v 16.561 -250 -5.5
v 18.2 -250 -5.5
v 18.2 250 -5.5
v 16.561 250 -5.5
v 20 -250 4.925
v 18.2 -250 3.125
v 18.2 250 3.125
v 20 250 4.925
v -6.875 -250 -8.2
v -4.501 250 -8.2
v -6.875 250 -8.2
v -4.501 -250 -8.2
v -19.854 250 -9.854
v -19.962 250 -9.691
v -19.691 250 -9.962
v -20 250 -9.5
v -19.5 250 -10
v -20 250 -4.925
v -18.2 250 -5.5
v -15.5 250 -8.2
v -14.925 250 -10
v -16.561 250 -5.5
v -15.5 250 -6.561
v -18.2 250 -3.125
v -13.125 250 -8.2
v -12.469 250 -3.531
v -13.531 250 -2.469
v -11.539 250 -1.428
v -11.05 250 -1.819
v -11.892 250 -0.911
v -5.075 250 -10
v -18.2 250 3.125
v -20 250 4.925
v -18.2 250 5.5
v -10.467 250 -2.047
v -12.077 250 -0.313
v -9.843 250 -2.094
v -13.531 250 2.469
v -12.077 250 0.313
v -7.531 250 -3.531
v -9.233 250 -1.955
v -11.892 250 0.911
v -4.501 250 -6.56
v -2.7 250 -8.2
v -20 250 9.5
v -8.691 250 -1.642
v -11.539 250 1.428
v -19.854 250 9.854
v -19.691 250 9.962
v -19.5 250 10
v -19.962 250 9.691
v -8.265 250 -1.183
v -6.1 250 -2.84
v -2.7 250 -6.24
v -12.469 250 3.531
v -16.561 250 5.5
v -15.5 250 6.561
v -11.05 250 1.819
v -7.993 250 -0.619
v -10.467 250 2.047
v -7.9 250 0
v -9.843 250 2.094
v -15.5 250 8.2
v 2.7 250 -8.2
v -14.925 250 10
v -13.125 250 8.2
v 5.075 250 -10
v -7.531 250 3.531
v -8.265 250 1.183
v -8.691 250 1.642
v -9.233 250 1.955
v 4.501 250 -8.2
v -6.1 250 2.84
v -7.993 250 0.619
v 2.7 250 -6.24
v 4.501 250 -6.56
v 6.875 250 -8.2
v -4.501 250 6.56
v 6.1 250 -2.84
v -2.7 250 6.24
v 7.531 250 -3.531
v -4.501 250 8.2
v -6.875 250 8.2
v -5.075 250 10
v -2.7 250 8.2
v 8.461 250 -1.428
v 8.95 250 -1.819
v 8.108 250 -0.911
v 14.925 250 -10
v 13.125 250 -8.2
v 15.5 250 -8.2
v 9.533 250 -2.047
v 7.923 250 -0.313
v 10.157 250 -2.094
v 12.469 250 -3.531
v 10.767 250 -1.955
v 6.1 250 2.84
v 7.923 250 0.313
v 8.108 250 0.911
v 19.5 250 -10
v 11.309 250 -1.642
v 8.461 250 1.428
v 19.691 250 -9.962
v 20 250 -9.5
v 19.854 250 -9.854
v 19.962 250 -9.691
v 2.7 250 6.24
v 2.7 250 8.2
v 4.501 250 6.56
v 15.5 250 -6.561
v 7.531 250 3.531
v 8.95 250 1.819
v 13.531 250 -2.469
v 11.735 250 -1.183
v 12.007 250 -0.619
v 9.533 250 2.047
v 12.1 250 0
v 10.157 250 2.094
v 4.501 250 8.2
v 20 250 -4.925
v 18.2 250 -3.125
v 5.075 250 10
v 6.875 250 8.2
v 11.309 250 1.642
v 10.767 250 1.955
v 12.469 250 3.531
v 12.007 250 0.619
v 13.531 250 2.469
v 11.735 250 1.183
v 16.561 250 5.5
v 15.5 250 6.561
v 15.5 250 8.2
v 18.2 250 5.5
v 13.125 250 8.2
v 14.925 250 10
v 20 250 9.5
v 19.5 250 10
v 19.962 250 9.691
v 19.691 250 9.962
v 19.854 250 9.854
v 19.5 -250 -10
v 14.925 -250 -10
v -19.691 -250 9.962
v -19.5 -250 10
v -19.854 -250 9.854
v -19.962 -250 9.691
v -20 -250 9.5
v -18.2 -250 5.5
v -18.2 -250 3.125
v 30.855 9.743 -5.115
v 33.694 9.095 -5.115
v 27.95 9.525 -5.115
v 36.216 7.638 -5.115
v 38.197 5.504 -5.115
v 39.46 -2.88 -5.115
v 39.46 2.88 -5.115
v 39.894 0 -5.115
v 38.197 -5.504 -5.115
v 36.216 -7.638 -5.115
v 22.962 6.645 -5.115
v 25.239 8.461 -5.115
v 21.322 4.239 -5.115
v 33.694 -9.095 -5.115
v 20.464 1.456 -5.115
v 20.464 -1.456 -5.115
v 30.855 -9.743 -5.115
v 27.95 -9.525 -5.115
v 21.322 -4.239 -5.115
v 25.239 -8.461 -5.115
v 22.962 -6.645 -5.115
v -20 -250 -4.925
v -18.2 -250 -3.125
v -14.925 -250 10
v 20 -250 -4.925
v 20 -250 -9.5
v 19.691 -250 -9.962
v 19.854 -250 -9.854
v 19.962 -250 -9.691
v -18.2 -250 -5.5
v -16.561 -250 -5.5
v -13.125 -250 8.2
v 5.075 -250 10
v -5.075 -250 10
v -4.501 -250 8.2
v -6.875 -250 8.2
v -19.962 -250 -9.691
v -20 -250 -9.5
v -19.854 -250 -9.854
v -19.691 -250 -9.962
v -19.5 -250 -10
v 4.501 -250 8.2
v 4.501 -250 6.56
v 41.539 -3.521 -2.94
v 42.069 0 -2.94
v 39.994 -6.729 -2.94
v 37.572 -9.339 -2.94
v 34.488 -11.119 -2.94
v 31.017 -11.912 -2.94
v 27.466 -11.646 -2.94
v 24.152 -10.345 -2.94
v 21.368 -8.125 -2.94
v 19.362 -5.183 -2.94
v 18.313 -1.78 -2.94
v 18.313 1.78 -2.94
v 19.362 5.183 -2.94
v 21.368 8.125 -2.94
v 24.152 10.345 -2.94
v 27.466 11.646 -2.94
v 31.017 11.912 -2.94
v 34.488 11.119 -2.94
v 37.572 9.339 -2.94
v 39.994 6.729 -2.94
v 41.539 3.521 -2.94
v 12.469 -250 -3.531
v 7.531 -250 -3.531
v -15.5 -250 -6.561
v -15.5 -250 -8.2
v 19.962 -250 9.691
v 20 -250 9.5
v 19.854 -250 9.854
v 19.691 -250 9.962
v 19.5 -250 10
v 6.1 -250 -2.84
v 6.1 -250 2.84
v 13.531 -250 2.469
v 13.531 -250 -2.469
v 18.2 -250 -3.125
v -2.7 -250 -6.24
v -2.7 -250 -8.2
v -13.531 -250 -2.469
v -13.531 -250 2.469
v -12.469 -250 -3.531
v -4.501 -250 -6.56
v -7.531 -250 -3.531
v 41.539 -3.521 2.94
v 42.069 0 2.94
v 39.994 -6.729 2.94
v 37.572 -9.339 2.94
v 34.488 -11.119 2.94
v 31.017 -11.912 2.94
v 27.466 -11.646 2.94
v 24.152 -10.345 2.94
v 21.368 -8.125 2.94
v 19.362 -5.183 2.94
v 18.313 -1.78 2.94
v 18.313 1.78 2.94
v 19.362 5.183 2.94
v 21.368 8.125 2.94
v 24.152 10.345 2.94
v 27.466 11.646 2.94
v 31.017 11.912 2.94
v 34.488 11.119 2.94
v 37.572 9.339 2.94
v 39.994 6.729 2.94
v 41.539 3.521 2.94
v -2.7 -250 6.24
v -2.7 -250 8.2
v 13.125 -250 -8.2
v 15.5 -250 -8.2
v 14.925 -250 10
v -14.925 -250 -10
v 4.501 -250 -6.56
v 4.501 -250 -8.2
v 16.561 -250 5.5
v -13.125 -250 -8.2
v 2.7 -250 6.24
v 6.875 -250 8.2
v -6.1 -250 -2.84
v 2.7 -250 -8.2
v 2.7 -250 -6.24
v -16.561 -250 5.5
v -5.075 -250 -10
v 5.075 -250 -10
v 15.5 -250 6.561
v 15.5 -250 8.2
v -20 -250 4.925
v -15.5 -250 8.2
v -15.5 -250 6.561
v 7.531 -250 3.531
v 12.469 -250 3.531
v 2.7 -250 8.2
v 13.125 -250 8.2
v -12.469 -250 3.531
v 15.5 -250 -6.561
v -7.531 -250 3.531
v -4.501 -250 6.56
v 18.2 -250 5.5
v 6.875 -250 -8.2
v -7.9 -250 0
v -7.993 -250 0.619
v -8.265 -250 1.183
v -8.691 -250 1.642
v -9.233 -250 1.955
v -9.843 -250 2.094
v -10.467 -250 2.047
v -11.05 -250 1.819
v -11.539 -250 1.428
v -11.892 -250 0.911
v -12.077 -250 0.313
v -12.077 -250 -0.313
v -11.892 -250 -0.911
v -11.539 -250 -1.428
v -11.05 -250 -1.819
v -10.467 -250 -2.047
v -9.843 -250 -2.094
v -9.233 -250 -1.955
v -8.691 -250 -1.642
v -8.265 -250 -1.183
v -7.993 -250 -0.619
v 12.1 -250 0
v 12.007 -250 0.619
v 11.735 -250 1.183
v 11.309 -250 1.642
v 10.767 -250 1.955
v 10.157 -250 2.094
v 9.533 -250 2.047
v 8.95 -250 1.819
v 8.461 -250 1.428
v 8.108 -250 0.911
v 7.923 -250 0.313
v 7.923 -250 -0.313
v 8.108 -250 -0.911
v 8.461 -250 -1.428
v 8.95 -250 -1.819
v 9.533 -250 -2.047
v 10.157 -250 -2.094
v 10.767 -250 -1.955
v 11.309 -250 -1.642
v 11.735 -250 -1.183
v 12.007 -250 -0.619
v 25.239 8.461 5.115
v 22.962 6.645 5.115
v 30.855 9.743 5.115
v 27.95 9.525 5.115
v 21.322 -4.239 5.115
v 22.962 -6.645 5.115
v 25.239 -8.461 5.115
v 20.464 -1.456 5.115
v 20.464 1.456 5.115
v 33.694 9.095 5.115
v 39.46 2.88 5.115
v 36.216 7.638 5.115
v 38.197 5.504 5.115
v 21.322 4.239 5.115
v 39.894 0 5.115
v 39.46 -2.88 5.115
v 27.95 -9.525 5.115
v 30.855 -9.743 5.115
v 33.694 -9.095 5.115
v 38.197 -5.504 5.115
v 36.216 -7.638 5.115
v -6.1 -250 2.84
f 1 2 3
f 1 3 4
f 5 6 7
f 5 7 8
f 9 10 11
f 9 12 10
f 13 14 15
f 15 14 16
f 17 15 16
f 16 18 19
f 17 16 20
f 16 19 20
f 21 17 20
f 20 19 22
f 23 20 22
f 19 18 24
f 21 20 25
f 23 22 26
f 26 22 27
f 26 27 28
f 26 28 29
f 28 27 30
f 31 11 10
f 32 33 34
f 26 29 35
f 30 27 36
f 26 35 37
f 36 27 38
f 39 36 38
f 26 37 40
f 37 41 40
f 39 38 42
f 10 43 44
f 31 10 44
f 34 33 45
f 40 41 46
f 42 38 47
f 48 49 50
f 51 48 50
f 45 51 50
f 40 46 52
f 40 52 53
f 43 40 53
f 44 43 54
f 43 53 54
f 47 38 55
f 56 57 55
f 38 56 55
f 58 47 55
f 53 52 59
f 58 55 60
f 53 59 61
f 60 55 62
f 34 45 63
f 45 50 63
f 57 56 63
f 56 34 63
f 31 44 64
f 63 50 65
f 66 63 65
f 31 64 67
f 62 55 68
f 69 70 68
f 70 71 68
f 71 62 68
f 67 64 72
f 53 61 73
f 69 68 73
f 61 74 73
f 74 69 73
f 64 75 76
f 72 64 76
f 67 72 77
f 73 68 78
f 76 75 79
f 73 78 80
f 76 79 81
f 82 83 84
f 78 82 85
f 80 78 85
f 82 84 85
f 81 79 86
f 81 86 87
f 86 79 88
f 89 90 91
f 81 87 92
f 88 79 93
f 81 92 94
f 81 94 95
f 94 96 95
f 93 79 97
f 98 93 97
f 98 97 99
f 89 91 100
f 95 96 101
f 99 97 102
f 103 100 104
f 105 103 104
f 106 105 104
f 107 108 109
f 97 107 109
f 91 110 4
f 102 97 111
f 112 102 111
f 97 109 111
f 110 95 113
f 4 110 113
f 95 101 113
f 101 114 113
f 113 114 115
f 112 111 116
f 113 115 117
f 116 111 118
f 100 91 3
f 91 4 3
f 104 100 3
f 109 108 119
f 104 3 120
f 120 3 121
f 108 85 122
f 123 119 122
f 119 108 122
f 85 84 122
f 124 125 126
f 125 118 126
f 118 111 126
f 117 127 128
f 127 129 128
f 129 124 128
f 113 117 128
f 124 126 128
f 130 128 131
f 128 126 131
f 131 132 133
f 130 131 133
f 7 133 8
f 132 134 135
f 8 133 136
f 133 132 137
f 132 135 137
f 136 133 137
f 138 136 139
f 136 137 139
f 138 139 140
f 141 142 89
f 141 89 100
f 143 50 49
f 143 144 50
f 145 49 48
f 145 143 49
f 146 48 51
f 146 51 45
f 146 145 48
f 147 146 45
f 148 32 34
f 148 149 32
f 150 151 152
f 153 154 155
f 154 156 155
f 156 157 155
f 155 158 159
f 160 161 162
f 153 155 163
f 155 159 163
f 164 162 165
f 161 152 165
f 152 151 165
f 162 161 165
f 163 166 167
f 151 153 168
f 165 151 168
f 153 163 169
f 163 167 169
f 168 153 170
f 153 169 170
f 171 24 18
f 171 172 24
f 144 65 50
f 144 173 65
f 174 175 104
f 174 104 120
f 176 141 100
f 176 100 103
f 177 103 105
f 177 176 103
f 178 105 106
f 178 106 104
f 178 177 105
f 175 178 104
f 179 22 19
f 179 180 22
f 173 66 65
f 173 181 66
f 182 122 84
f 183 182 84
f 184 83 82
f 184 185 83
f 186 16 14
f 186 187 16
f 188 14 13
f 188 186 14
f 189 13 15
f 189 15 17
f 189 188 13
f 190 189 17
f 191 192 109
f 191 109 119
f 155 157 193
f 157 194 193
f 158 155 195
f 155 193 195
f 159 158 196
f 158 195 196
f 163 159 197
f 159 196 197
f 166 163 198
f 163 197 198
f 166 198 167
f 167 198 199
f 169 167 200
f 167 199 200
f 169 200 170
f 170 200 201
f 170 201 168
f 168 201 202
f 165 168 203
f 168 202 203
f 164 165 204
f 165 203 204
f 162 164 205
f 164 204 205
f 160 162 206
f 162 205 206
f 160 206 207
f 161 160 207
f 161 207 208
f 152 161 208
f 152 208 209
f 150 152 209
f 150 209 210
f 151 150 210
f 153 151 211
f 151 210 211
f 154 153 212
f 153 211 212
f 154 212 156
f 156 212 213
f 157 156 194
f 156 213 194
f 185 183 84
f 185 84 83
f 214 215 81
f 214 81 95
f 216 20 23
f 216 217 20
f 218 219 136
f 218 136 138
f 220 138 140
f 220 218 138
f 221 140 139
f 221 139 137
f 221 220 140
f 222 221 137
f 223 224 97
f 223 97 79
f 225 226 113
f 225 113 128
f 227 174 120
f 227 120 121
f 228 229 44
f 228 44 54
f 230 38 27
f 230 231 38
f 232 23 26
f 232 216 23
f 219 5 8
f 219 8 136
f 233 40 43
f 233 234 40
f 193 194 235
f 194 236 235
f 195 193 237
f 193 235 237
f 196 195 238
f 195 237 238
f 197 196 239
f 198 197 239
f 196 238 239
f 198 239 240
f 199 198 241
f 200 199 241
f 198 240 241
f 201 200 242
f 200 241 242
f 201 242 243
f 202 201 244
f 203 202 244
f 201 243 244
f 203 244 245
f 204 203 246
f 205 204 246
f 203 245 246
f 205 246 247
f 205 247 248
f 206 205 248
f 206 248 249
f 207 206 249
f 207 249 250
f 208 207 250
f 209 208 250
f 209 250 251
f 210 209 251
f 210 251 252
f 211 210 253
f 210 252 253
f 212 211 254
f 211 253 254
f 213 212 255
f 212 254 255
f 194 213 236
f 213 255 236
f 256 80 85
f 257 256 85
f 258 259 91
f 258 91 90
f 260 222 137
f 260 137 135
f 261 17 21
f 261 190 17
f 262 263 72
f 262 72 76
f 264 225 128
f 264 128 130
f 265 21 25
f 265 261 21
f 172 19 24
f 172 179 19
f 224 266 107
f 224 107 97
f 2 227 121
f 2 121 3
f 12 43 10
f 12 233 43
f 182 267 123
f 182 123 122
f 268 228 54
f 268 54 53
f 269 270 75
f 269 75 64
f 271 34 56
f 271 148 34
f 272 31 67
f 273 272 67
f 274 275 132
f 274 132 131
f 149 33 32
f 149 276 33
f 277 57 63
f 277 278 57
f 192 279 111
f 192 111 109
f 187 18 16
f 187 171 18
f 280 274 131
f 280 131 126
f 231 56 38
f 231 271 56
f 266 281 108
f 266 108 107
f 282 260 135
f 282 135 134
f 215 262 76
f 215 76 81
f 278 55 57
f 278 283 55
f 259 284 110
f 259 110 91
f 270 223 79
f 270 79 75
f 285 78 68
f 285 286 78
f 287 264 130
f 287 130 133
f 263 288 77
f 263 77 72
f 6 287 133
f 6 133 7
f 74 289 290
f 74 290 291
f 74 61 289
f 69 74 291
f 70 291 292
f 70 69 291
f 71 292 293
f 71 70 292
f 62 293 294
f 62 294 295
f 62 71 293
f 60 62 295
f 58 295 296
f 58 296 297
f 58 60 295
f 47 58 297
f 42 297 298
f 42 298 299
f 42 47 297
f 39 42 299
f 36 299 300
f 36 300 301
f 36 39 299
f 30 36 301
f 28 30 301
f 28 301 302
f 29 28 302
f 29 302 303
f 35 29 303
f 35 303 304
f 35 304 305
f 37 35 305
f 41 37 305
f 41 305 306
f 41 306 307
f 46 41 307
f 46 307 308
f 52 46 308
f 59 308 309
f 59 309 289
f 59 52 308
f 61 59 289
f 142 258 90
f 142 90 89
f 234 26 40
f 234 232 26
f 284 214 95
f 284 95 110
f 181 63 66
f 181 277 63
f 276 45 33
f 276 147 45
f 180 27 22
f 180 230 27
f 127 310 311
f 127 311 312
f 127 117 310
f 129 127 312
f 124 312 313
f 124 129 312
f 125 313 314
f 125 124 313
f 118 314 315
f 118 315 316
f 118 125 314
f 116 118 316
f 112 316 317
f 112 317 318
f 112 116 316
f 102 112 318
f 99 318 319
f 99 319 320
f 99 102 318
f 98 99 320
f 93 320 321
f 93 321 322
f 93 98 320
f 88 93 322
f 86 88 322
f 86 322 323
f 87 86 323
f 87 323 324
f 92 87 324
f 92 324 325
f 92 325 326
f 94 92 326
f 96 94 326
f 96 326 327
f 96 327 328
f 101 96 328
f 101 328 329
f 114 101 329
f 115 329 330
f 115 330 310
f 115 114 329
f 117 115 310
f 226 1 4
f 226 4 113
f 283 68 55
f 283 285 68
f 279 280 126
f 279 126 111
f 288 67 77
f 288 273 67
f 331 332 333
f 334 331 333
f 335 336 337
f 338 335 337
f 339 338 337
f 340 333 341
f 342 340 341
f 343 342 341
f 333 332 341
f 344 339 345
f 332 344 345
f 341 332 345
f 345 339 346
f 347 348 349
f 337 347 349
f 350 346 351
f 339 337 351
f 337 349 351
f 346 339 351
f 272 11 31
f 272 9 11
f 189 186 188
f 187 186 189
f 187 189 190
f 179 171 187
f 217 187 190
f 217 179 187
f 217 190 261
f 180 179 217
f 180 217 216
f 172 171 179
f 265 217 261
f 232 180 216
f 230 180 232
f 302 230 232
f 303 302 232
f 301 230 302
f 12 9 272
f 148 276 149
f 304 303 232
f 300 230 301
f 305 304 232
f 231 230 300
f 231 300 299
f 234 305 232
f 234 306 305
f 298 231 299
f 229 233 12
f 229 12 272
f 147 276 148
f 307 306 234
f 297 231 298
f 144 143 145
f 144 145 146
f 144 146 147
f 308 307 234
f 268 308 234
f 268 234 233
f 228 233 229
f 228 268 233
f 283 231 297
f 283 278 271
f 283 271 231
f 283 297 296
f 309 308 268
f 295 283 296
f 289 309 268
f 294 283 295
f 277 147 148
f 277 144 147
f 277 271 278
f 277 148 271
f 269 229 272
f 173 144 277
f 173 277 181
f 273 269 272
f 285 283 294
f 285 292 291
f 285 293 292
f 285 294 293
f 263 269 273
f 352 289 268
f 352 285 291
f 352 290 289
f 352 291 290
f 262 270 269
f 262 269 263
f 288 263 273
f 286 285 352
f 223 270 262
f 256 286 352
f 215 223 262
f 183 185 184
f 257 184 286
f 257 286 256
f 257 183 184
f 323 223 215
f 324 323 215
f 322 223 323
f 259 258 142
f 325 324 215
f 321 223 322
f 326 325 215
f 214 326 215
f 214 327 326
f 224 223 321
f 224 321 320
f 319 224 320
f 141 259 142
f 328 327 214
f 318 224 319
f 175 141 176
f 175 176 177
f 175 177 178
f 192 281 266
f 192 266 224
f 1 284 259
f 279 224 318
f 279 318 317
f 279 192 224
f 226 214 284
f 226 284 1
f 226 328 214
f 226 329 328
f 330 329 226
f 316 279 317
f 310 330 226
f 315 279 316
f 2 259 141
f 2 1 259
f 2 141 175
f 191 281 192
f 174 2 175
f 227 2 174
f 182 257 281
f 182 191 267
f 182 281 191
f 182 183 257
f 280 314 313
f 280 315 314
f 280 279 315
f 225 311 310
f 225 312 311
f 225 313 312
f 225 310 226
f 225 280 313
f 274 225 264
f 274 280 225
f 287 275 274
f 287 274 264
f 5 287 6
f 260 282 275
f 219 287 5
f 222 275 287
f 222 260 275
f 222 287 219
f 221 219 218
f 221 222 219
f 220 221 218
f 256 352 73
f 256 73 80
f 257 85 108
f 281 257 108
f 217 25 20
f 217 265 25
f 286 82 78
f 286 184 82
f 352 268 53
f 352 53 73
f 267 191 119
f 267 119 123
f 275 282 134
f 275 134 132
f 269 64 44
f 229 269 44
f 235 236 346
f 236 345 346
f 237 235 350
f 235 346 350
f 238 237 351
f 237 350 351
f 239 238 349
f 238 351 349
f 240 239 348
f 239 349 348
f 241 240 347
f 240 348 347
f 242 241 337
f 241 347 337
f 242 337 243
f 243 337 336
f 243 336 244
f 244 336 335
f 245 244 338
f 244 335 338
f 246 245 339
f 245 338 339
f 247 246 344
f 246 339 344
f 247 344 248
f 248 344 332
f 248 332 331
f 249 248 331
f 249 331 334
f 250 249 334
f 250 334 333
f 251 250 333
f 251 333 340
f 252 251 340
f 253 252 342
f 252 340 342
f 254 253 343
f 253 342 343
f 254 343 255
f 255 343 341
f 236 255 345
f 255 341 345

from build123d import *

# Parameters (mm, degrees)
F0_R     = 2.1
F1_DEPTH = 250


with BuildPart() as f1:
    # F0 (on Front) → F1 (new body, symmetric)
    with BuildSketch(Plane.XZ):
        with BuildLine():
            Line((2.7, -6.24), (2.7, -8.2))
            Line((2.7, -8.2), (0, -8.2))
            Line((0, -8.2), (0, -10))
            Line((0, -10), (5.075, -10))
            Line((5.075, -10), (6.875, -8.2))
            Line((6.875, -8.2), (4.50132, -8.2))
            Line((4.50132, -8.2), (4.50132, -6.56))
            Line((4.50132, -6.56), (7.530778, -3.530543))
            Line((7.530778, -3.530543), (10, -3.530543))
            Line((10, -3.530543), (12.469222, -3.530543))
            Line((12.469222, -3.530543), (15.5, -6.56132))
            Line((15.5, -6.56132), (15.5, -8.2))
            Line((15.5, -8.2), (13.125, -8.2))
            Line((13.125, -8.2), (14.925, -10))
            Line((14.925, -10), (19.5, -10))
            ThreePointArc((19.5, -10), (19.853553, -9.853553), (20, -9.5))
            Line((20, -9.5), (20, -4.925))
            Line((20, -4.925), (18.2, -3.125))
            Line((18.2, -3.125), (18.2, -5.5))
            Line((18.2, -5.5), (16.56132, -5.5))
            Line((16.56132, -5.5), (13.530543, -2.469222))
            Line((13.530543, -2.469222), (13.530543, 0))
            Line((13.530543, 0), (13.530543, 2.469222))
            Line((13.530543, 2.469222), (16.56132, 5.5))
            Line((16.56132, 5.5), (18.2, 5.5))
            Line((18.2, 5.5), (18.2, 3.125))
            Line((18.2, 3.125), (20, 4.925))
            Line((20, 4.925), (20, 9.5))
            ThreePointArc((20, 9.5), (19.853553, 9.853553), (19.5, 10))
            Line((19.5, 10), (14.925, 10))
            Line((14.925, 10), (13.125, 8.2))
            Line((13.125, 8.2), (15.5, 8.2))
            Line((15.5, 8.2), (15.5, 6.56132))
            Line((15.5, 6.56132), (12.469222, 3.530543))
            Line((12.469222, 3.530543), (10, 3.530543))
            Line((10, 3.530543), (7.530778, 3.530543))
            Line((7.530778, 3.530543), (4.50132, 6.56))
            Line((4.50132, 6.56), (4.50132, 8.2))
            Line((4.50132, 8.2), (6.875, 8.2))
            Line((6.875, 8.2), (5.075, 10))
            Line((5.075, 10), (0, 10))
            Line((0, 10), (0, 8.2))
            Line((0, 8.2), (2.7, 8.2))
            Line((2.7, 8.2), (2.7, 6.24))
            Line((2.7, 6.24), (6.1, 2.84))
            Line((6.1, 2.84), (6.1, -2.84))
            Line((6.1, -2.84), (2.7, -6.24))
        make_face()
        with Locations((10, 0)):
            Circle(F0_R, mode=Mode.SUBTRACT)
        with BuildLine():
            Line((0, -10), (0, -8.2))
            Line((0, -8.2), (-2.7, -8.2))
            Line((-2.7, -8.2), (-2.7, -6.24))
            Line((-2.7, -6.24), (-6.1, -2.84))
            Line((-6.1, -2.84), (-6.1, 2.84))
            Line((-6.1, 2.84), (-2.7, 6.24))
            Line((-2.7, 6.24), (-2.7, 8.2))
            Line((-2.7, 8.2), (0, 8.2))
            Line((0, 8.2), (0, 10))
            Line((0, 10), (-5.075, 10))
            Line((-5.075, 10), (-6.875, 8.2))
            Line((-6.875, 8.2), (-4.50132, 8.2))
            Line((-4.50132, 8.2), (-4.50132, 6.56))
            Line((-4.50132, 6.56), (-7.530778, 3.530543))
            Line((-7.530778, 3.530543), (-10, 3.530543))
            Line((-10, 3.530543), (-12.469222, 3.530543))
            Line((-12.469222, 3.530543), (-15.5, 6.56132))
            Line((-15.5, 6.56132), (-15.5, 8.2))
            Line((-15.5, 8.2), (-13.125, 8.2))
            Line((-13.125, 8.2), (-14.925, 10))
            Line((-14.925, 10), (-19.5, 10))
            ThreePointArc((-19.5, 10), (-19.853553, 9.853553), (-20, 9.5))
            Line((-20, 9.5), (-20, 4.925))
            Line((-20, 4.925), (-18.2, 3.125))
            Line((-18.2, 3.125), (-18.2, 5.5))
            Line((-18.2, 5.5), (-16.56132, 5.5))
            Line((-16.56132, 5.5), (-13.530543, 2.469222))
            Line((-13.530543, 2.469222), (-13.530543, 0))
            Line((-13.530543, 0), (-13.530543, -2.469222))
            Line((-13.530543, -2.469222), (-16.56132, -5.5))
            Line((-16.56132, -5.5), (-18.2, -5.5))
            Line((-18.2, -5.5), (-18.2, -3.125))
            Line((-18.2, -3.125), (-20, -4.925))
            Line((-20, -4.925), (-20, -9.5))
            ThreePointArc((-20, -9.5), (-19.853553, -9.853553), (-19.5, -10))
            Line((-19.5, -10), (-14.925, -10))
            Line((-14.925, -10), (-13.125, -8.2))
            Line((-13.125, -8.2), (-15.5, -8.2))
            Line((-15.5, -8.2), (-15.5, -6.56132))
            Line((-15.5, -6.56132), (-12.469222, -3.530543))
            Line((-12.469222, -3.530543), (-10, -3.530543))
            Line((-10, -3.530543), (-7.530778, -3.530543))
            Line((-7.530778, -3.530543), (-4.50132, -6.56))
            Line((-4.50132, -6.56), (-4.50132, -8.2))
            Line((-4.50132, -8.2), (-6.875, -8.2))
            Line((-6.875, -8.2), (-5.075, -10))
            Line((-5.075, -10), (0, -10))
        make_face()
        with Locations((-10, 0)):
            Circle(F0_R, mode=Mode.SUBTRACT)
    extrude(amount=F1_DEPTH, both=True)


with BuildPart() as f3:
    # F2 (on Front) → F3 (revolve)
    with BuildSketch(Plane.XZ):
        Polygon((42.069407, 2.94), (39.894407, 5.115), (30.124407, 5.115), (30.124407, -5.115), (39.894407, -5.115), (42.069407, -2.94), align=None)
    revolve(axis=Axis((30.124407, 0, 0), (0, 0, -1)))


solid = Compound([f1.part, f3.part])
